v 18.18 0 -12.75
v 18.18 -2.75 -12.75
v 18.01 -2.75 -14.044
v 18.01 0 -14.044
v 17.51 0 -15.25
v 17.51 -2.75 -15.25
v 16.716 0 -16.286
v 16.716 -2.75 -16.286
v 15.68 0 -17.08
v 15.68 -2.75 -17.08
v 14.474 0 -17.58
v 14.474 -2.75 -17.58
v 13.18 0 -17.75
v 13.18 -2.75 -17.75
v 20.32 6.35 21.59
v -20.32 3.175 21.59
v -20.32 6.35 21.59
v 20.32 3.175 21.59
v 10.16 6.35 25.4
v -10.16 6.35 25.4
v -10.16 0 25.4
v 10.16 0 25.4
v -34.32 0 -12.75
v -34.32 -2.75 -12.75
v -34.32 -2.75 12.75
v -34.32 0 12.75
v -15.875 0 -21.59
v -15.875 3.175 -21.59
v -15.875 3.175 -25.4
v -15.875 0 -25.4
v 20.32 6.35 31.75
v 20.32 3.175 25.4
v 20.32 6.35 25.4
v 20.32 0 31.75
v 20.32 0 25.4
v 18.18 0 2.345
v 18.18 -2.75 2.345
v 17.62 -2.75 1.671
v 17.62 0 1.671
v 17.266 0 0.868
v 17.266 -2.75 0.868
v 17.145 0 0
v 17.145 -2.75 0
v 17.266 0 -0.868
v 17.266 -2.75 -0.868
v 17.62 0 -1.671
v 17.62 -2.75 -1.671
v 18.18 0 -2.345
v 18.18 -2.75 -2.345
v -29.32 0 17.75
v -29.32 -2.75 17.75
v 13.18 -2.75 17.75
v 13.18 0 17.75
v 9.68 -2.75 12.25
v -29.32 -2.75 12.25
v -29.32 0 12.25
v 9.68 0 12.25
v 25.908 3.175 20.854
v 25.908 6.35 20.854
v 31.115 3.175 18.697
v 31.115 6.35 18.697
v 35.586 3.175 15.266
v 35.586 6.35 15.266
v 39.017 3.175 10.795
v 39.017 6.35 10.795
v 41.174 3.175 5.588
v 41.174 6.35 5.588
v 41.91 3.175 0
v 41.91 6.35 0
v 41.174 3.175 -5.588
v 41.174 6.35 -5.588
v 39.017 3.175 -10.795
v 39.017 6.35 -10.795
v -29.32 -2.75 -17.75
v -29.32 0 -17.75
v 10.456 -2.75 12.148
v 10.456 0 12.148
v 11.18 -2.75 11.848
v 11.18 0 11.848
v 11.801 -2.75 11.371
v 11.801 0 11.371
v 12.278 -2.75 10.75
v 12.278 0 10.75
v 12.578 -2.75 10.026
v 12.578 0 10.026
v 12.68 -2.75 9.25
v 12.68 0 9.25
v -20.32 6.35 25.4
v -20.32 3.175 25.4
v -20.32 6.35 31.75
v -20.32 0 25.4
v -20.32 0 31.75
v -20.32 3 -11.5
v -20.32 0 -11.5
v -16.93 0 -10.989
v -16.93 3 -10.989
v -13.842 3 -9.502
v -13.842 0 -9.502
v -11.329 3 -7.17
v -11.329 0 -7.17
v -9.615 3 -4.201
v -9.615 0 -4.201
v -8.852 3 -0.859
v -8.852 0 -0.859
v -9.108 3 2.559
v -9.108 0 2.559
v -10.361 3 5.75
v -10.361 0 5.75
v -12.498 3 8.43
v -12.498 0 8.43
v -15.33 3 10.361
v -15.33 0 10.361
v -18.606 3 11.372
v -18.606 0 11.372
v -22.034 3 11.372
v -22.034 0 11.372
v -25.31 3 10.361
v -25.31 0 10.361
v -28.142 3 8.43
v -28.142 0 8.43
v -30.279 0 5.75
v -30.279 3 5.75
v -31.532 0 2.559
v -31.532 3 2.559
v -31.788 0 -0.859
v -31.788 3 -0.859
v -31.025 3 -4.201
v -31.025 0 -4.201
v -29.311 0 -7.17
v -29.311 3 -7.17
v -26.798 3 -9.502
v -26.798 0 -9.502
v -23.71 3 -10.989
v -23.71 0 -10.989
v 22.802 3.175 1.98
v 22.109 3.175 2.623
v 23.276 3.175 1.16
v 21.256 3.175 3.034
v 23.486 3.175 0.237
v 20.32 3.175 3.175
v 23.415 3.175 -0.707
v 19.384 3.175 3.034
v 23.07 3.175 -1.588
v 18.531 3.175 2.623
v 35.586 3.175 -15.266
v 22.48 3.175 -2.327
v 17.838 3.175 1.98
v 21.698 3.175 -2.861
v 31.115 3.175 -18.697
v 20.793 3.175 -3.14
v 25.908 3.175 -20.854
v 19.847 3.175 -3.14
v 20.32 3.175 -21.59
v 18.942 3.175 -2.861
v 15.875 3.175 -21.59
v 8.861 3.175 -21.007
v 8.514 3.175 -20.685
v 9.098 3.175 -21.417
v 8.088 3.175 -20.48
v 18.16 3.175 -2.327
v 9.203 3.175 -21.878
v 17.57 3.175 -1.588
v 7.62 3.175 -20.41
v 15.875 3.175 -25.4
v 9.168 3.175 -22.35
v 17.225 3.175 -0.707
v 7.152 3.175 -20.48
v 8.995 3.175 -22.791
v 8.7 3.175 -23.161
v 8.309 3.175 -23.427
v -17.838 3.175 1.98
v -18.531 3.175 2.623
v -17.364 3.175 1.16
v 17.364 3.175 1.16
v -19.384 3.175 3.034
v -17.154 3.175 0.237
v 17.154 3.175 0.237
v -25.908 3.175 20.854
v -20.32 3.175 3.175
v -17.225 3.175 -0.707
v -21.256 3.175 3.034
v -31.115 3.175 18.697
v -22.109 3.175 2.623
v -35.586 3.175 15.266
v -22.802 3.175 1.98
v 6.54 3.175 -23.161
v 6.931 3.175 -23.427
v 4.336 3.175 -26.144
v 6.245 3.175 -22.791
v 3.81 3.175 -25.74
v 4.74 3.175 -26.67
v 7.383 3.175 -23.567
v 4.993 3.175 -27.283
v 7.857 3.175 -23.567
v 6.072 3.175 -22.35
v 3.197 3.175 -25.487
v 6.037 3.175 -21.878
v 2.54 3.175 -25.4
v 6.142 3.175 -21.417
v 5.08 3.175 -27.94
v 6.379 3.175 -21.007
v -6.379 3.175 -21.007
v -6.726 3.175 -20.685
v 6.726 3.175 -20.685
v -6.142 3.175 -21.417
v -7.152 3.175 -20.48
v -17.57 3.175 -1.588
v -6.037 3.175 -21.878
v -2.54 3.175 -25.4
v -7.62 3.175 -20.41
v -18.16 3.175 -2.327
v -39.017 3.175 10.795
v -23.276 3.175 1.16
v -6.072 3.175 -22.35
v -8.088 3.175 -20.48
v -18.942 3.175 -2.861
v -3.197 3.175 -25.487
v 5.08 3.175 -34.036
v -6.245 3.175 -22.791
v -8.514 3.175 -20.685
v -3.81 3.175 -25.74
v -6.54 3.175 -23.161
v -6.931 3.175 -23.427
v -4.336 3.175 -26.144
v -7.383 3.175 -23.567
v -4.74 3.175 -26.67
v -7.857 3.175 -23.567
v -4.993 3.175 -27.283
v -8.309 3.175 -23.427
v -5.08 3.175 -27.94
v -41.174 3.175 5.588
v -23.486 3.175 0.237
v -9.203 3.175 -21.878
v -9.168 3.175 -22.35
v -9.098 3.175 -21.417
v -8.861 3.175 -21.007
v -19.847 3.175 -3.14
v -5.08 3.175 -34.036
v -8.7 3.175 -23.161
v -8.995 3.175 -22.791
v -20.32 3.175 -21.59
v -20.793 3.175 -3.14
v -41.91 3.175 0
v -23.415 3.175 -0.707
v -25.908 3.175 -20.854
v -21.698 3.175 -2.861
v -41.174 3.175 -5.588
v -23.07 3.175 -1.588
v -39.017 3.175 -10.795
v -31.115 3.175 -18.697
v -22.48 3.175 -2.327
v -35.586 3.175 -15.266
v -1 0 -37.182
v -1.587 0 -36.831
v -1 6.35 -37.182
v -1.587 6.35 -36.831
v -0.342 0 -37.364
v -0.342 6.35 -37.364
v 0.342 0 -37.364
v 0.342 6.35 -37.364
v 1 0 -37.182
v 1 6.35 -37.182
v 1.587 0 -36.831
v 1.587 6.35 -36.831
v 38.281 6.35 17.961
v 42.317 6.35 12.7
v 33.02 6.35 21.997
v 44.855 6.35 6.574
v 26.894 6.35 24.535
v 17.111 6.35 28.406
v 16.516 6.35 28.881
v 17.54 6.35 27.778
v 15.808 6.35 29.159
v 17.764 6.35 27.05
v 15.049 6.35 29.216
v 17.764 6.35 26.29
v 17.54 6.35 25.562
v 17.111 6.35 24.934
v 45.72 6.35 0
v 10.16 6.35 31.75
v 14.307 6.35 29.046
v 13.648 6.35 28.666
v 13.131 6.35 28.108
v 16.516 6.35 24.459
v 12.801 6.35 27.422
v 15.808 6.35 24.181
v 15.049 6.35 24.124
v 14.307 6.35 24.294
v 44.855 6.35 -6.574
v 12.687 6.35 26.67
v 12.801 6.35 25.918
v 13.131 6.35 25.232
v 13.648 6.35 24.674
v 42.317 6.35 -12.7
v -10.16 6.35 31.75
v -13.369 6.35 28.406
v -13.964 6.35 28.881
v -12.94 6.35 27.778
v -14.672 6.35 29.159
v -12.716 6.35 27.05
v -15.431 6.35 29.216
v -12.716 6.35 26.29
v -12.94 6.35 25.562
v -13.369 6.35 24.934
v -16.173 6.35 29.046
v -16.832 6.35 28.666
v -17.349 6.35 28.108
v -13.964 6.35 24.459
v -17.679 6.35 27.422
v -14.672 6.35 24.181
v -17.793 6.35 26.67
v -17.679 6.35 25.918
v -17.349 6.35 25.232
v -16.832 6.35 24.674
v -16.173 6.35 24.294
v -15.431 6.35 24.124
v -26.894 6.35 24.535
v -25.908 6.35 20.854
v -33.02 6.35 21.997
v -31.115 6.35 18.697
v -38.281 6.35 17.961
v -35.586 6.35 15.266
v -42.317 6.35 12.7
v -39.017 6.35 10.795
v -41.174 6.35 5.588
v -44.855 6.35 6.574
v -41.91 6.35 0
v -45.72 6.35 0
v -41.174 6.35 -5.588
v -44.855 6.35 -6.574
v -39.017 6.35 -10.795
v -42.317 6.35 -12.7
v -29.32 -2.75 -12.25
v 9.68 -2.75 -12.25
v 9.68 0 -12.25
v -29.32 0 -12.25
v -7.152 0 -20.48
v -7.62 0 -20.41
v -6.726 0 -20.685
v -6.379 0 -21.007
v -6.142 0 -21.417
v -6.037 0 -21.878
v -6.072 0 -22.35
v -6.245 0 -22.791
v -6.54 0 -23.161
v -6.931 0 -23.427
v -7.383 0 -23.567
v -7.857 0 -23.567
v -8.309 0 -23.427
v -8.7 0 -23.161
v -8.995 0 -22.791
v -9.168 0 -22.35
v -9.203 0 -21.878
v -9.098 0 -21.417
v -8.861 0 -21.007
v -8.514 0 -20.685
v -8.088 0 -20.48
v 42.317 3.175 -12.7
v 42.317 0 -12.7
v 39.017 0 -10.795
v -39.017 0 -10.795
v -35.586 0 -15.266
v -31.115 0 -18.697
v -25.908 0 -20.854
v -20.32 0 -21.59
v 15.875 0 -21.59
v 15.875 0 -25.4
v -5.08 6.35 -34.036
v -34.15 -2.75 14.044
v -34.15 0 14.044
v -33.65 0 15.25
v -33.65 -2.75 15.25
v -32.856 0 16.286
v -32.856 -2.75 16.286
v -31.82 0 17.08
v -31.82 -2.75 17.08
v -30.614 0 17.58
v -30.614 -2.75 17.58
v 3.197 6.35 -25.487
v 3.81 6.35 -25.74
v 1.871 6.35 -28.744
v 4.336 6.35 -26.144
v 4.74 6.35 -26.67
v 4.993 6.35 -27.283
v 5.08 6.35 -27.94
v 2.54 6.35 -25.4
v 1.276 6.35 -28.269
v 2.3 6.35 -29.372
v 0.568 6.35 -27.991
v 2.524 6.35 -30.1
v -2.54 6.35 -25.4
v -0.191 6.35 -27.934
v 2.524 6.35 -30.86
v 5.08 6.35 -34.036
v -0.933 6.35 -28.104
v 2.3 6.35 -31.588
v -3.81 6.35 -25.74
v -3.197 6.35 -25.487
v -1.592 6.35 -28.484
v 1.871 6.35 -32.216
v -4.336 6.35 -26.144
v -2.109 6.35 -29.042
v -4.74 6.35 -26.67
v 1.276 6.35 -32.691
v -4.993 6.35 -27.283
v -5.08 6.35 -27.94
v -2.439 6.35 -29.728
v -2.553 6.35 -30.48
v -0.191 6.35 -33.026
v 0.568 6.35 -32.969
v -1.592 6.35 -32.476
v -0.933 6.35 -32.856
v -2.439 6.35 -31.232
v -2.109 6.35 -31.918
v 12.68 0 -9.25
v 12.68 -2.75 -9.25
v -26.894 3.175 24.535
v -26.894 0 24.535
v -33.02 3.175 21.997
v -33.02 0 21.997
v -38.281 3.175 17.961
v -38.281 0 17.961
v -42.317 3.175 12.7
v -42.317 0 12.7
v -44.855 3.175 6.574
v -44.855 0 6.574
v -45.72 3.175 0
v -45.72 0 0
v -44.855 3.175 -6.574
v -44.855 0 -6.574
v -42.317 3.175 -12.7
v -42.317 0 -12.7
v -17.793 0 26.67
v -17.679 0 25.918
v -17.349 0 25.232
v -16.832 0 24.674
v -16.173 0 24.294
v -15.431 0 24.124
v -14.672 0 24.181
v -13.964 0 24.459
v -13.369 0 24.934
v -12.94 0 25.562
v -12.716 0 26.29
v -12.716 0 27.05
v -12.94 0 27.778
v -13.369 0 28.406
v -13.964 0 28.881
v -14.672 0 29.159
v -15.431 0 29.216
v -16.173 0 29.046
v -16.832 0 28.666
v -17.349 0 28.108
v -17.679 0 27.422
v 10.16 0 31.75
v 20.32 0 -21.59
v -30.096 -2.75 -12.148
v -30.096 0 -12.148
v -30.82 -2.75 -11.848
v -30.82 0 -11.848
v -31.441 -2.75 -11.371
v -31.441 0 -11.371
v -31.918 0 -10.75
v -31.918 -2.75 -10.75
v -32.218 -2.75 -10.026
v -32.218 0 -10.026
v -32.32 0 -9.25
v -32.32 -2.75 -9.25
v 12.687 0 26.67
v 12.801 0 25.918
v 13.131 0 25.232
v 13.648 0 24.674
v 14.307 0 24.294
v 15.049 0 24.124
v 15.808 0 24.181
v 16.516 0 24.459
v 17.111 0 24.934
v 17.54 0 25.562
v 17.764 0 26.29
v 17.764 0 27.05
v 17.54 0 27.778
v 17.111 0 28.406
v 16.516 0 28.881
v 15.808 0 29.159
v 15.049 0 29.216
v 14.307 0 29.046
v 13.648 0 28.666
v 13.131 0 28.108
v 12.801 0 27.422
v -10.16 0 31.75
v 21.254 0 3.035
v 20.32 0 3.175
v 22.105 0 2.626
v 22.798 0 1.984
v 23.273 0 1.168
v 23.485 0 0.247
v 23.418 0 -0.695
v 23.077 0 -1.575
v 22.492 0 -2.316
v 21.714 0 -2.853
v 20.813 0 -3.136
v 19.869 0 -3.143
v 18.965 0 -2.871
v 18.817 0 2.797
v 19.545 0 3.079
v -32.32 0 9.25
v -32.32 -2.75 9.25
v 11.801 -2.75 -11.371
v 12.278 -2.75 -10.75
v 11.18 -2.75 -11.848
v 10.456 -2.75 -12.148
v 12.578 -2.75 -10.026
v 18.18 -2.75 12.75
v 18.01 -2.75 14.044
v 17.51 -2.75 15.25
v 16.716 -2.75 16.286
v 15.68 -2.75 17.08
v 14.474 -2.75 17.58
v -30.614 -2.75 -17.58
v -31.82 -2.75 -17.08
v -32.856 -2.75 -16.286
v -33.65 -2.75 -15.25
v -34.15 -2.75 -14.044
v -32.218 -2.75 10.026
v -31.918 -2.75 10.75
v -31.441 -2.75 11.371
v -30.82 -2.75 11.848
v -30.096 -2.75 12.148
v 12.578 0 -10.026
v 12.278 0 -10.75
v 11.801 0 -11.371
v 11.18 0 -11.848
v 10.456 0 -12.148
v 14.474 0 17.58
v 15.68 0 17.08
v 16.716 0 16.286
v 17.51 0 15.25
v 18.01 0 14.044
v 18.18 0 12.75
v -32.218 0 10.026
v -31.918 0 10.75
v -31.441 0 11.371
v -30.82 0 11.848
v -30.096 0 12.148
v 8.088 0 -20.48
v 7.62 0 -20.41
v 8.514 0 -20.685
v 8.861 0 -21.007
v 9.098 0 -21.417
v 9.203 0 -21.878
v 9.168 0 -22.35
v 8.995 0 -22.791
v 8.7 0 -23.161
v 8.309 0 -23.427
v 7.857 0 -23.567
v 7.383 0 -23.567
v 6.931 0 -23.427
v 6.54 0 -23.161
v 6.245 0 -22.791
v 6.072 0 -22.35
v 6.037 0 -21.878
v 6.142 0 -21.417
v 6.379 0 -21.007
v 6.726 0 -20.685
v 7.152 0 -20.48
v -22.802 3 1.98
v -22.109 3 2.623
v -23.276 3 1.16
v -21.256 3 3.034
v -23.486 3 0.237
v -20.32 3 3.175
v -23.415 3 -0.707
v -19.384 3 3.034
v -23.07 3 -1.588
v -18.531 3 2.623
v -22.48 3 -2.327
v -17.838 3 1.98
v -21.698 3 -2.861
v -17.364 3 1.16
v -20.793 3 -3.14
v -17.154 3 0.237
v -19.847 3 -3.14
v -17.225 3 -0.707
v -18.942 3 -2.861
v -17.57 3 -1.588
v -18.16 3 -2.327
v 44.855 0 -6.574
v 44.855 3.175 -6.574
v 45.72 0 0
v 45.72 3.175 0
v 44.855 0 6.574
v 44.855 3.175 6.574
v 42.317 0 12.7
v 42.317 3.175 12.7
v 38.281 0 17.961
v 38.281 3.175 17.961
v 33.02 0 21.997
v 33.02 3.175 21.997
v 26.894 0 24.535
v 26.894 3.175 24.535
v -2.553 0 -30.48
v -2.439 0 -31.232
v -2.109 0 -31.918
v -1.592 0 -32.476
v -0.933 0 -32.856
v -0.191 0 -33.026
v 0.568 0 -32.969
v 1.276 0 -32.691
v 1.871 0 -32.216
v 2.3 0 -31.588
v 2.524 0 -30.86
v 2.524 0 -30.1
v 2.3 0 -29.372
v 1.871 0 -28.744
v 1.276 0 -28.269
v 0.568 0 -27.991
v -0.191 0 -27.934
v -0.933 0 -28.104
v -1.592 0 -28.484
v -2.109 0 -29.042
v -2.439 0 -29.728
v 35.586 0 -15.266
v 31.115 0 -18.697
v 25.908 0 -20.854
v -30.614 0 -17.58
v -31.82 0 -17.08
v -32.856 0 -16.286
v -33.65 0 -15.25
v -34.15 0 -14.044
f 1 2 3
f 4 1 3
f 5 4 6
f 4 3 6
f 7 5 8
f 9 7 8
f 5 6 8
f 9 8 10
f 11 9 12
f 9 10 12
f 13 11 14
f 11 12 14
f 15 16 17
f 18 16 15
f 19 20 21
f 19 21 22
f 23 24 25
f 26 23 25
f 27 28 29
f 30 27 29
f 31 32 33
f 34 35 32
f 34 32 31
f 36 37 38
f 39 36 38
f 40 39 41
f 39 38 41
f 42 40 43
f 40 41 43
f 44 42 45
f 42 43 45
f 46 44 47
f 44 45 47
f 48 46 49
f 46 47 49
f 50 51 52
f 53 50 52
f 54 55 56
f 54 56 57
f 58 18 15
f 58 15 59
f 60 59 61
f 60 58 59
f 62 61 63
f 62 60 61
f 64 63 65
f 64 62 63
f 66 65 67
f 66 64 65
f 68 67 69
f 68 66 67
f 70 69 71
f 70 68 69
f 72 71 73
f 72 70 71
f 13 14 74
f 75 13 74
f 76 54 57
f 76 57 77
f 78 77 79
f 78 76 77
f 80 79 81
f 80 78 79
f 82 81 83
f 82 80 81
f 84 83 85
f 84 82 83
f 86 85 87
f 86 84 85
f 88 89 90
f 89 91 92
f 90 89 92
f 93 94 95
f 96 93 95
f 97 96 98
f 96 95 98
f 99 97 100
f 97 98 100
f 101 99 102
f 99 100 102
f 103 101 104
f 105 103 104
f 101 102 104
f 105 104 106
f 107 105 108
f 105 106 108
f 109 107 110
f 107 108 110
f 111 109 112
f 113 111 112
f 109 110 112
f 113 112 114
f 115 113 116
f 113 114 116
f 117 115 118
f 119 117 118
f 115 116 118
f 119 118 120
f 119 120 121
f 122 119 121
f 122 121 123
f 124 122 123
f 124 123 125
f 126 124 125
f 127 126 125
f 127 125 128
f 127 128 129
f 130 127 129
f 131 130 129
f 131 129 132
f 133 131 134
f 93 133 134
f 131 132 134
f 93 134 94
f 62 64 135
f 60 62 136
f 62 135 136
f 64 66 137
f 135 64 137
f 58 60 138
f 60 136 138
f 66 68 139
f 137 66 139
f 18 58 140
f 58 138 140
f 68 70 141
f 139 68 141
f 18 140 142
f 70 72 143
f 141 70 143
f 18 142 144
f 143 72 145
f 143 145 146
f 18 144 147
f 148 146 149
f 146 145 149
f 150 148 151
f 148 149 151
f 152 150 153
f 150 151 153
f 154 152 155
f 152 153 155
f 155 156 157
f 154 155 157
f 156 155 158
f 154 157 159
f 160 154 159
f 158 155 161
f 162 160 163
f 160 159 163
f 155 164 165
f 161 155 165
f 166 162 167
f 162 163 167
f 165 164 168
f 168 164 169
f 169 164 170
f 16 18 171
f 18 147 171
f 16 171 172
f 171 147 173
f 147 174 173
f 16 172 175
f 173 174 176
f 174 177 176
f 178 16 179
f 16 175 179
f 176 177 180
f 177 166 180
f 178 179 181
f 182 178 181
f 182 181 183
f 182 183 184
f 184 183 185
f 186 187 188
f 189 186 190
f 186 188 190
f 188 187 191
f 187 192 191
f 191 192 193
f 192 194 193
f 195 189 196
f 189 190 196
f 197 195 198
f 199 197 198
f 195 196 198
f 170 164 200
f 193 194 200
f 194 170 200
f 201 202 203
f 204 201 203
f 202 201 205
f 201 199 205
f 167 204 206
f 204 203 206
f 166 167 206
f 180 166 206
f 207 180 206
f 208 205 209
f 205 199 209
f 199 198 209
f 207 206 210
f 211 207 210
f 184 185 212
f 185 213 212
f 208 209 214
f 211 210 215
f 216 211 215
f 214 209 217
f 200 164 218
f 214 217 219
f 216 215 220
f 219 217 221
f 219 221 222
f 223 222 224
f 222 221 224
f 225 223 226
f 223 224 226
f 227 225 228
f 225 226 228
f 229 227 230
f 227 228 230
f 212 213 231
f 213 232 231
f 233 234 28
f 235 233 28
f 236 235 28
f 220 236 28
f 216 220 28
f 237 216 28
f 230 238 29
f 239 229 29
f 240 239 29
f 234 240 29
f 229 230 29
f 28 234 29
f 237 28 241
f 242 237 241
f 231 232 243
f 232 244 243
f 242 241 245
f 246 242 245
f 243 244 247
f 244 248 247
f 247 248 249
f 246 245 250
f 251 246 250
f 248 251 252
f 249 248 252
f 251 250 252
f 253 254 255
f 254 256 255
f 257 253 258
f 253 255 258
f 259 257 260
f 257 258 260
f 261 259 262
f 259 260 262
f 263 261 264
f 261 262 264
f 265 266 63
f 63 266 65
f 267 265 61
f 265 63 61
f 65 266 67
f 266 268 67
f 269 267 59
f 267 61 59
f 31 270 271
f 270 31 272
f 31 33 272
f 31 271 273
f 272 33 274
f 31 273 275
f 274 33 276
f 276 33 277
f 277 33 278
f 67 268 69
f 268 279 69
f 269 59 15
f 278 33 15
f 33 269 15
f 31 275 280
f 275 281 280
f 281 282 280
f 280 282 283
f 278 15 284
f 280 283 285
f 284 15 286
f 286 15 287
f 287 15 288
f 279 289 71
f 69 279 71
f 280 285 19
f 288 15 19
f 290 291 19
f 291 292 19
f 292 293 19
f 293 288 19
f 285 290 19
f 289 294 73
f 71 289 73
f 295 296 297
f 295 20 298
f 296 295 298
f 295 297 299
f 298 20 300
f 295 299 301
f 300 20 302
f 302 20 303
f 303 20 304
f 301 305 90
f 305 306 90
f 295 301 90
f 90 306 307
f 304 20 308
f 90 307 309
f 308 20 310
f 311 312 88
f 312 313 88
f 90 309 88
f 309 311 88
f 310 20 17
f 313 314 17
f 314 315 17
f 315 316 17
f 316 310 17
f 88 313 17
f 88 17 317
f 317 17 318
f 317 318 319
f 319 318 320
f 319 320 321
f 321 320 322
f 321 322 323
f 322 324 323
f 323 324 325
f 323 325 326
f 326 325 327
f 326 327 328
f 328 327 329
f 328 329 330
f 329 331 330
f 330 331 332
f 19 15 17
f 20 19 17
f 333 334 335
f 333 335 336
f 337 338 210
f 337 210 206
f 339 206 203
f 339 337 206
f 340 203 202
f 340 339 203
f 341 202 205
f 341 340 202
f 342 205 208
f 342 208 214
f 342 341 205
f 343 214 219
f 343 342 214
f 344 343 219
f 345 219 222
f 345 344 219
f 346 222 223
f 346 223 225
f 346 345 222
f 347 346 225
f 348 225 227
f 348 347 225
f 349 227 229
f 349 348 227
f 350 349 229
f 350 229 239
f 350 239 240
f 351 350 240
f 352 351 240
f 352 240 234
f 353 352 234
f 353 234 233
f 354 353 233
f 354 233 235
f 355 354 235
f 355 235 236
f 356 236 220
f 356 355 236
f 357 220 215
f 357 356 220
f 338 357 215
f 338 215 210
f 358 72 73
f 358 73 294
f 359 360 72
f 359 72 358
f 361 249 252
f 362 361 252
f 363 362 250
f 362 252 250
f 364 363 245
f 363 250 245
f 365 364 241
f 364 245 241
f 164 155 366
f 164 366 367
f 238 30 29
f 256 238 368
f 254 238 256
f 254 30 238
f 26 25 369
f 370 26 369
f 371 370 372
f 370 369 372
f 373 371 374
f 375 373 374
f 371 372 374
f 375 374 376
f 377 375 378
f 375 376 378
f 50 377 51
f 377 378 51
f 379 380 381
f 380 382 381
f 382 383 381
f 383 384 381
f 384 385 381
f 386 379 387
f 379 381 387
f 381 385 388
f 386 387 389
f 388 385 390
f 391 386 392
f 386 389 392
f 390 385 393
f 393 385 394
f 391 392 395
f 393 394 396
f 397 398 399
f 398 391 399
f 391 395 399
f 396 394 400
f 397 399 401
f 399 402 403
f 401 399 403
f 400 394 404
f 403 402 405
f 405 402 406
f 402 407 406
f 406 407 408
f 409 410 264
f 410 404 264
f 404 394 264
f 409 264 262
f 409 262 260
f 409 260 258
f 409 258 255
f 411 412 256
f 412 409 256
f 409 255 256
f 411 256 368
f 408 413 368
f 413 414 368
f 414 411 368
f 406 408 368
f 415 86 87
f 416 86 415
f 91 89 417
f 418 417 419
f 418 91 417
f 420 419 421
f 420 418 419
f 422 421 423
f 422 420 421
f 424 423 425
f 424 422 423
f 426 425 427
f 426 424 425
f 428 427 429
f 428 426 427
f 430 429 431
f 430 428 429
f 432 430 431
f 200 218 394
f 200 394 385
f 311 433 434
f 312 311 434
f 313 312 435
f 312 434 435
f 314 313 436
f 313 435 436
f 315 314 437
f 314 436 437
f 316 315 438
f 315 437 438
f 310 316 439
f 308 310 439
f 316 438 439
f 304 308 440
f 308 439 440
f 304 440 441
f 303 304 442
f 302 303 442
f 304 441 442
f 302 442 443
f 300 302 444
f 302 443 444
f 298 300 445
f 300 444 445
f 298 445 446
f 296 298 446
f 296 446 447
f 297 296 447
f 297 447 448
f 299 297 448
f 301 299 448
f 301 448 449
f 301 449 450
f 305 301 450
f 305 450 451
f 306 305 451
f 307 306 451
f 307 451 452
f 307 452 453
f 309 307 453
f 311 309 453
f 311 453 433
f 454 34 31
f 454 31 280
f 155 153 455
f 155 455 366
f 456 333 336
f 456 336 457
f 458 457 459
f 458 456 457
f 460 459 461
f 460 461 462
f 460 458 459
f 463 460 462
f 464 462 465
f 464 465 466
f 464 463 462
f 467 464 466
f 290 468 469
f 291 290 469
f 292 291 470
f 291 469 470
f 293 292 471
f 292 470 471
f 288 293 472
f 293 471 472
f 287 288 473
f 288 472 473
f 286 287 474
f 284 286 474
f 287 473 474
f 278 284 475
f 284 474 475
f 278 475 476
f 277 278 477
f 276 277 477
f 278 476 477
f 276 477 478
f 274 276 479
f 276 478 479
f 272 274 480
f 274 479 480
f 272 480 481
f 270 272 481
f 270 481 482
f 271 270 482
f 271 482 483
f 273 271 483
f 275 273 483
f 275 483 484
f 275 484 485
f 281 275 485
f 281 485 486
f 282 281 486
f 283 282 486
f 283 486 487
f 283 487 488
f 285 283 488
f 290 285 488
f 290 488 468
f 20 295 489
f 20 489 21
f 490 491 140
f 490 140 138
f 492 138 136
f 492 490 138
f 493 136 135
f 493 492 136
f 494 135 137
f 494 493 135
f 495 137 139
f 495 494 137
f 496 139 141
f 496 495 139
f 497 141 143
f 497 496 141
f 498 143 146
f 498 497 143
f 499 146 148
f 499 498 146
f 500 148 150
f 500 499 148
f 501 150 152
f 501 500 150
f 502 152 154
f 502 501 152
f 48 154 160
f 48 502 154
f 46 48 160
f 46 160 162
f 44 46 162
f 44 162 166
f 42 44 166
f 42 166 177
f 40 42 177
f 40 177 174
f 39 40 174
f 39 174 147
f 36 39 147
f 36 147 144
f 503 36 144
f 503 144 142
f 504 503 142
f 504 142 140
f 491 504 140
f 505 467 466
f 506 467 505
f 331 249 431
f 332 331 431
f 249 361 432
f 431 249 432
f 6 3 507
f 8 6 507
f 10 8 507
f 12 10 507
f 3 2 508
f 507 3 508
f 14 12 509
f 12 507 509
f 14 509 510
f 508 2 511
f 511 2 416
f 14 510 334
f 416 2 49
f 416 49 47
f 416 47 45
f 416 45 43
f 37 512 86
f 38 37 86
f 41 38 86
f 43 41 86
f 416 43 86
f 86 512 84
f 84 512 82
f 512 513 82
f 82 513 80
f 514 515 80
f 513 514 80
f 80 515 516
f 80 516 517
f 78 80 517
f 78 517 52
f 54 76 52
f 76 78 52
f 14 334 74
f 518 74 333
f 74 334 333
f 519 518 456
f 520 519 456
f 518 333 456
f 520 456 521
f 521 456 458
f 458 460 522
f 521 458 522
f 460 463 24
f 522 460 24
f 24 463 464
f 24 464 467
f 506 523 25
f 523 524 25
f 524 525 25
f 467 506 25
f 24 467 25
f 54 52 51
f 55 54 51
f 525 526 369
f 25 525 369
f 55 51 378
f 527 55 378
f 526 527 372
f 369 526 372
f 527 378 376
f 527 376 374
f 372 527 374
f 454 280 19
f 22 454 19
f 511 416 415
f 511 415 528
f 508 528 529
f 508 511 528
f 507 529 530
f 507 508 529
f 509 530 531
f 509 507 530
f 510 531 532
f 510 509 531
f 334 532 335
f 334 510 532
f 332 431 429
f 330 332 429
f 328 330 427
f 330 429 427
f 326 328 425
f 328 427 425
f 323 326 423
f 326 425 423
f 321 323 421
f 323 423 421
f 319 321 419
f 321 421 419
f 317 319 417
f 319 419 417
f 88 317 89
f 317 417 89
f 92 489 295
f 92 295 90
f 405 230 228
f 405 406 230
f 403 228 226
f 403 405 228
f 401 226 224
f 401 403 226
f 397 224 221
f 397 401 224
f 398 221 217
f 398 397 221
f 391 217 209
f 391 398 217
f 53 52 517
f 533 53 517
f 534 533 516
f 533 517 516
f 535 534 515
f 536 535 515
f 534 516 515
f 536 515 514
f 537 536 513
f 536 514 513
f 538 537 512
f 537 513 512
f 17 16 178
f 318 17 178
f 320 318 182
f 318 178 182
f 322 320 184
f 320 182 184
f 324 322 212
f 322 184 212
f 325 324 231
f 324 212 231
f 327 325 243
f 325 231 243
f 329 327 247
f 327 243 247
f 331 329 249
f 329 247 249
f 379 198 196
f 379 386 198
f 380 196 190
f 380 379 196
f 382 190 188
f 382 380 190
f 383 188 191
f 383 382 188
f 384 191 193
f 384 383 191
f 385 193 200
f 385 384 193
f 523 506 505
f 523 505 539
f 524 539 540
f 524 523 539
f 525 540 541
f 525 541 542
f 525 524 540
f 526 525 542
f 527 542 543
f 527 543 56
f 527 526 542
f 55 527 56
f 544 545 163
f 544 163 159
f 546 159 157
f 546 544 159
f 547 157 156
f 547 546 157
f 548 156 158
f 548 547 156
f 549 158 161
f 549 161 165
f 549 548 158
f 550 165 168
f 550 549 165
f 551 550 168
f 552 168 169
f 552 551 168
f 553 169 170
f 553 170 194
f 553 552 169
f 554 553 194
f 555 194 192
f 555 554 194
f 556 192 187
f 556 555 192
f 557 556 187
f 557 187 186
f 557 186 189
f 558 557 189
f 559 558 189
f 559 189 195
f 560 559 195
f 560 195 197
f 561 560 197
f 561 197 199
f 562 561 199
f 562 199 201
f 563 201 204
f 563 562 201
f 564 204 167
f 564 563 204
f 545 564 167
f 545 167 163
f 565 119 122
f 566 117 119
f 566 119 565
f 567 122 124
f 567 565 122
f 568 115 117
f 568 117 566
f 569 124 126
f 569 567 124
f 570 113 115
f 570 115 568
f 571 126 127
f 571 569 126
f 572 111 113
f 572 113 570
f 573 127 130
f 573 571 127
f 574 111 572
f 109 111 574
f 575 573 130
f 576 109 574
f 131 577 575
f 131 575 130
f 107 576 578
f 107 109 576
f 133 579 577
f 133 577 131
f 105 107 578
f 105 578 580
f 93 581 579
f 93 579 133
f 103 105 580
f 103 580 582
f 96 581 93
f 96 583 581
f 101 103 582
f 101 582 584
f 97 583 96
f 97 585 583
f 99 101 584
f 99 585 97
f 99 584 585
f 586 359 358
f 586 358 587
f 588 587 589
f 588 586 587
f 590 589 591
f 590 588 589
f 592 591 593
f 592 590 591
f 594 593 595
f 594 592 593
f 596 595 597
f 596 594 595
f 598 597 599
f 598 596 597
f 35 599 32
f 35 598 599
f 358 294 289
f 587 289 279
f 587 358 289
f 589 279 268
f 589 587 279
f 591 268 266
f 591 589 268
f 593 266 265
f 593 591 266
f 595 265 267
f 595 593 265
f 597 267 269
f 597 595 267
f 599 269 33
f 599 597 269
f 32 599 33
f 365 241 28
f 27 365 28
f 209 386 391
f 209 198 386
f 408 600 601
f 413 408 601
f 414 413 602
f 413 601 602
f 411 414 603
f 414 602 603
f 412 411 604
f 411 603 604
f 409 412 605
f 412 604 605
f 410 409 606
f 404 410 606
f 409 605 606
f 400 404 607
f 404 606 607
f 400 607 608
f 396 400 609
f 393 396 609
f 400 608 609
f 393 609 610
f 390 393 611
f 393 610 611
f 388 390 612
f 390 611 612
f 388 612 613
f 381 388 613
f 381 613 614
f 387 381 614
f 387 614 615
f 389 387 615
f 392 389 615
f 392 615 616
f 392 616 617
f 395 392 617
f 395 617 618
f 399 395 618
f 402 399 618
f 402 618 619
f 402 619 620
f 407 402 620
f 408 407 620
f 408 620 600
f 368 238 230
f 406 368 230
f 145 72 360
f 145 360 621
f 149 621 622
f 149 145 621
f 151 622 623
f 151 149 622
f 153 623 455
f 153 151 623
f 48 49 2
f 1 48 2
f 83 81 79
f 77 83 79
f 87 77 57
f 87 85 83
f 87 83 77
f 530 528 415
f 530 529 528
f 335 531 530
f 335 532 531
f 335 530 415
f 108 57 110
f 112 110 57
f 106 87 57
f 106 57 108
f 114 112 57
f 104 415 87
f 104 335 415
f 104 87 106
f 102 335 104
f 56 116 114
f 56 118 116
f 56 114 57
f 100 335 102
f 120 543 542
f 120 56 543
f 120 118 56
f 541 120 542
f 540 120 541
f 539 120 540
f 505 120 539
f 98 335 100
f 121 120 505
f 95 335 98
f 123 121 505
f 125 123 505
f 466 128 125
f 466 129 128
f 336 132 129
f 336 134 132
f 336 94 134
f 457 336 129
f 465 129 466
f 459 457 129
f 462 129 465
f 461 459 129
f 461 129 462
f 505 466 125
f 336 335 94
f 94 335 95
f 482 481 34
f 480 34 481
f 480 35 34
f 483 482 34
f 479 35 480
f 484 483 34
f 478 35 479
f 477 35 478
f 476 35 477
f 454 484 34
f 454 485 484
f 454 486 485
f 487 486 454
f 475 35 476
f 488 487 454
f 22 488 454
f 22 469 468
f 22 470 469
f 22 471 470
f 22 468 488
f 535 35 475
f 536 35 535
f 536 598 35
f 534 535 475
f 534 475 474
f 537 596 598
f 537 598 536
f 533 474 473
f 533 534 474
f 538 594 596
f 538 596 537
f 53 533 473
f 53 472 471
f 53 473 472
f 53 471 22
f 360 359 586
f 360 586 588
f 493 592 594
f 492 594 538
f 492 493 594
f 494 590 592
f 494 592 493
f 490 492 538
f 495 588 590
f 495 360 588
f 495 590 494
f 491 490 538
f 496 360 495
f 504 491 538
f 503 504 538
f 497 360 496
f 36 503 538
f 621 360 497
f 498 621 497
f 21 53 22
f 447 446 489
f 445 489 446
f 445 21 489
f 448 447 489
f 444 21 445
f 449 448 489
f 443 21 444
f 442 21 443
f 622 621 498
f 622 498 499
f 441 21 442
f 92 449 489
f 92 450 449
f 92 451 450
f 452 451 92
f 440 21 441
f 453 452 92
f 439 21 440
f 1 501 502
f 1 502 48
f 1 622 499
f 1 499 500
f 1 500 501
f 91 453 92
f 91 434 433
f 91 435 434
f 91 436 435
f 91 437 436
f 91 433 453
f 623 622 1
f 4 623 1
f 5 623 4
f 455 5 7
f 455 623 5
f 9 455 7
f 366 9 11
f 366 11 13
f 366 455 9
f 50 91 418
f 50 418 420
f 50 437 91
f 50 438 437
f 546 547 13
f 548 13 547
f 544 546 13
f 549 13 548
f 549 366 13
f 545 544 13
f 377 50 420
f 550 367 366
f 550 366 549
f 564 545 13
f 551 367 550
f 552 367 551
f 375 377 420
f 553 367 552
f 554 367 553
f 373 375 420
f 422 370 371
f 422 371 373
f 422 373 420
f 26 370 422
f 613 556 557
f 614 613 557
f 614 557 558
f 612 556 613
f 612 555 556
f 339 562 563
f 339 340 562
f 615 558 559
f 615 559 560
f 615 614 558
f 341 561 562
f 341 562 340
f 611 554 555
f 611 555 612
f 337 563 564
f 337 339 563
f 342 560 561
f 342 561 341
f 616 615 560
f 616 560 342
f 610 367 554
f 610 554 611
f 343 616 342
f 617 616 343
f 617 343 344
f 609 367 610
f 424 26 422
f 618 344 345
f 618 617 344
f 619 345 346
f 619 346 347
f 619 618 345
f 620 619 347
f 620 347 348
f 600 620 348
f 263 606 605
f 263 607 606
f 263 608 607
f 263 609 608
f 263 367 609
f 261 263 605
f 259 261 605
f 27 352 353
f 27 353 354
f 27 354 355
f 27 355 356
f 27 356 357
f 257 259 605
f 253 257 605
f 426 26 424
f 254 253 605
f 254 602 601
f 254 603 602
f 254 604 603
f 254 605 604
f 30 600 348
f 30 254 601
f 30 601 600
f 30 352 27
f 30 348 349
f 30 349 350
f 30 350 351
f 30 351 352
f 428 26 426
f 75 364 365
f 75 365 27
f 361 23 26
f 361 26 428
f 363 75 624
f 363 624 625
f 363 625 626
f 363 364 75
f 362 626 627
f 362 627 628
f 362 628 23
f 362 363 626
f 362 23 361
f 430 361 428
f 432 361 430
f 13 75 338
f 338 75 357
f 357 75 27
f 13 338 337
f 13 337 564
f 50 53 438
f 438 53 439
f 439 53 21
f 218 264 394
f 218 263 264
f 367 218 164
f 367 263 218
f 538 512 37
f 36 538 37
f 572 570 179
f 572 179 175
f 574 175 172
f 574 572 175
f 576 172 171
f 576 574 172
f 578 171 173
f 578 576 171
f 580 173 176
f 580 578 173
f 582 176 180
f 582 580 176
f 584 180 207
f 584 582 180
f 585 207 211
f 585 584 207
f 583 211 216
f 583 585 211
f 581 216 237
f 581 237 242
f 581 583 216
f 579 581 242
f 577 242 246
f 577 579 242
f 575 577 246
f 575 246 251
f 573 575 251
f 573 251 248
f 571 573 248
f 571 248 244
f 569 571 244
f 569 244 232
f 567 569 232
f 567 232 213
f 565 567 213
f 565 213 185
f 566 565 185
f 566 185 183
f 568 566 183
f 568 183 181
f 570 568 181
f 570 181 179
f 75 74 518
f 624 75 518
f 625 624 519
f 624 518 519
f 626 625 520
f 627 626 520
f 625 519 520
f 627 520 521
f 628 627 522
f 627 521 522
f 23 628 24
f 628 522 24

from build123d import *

# Parameters (mm, degrees)
SKETCH1_R                    = 3.175
SKETCH1_R_2                  = 1.5875
BOSS_EXTRUDE1_DEPTH          = 3.175
CUT_EXTRUDE1_REACH           = 61.599
BOSS_EXTRUDE2_DEPTH          = 3.175
TAP_DRILL_FOR_10_HELICOIL2_D = 5.1054
FILLET1_R                    = 2.54
CUT_EXTRUDE2_REACH           = 61.146
SKETCH20_W                   = 20.32
SKETCH20_H                   = 6.35
SKETCH22_R                   = 11.5
CUT_EXTRUDE3_DEPTH           = 3
BOSS_EXTRUDE4_START          = 2.75
BOSS_EXTRUDE4_DEPTH          = 2.75


with BuildPart() as part:
    # Sketch1 → Boss-Extrude1 (new body)
    with BuildSketch(Plane(origin=(0, 0, 0), x_dir=(1, 0, 0), z_dir=(0, 1, 0))):
        with BuildLine():
            Line((-20.32, 25.4), (-15.875, 25.4))
            Line((-15.875, 25.4), (0, 38.1))
            Line((0, 38.1), (15.875, 25.4))
            Line((15.875, 25.4), (20.32, 25.4))
            ThreePointArc((20.32, 25.4), (45.72, 0), (20.32, -25.4))
            Line((20.32, -25.4), (20.32, -31.75))
            Line((20.32, -31.75), (-20.32, -31.75))
            Line((-20.32, -31.75), (-20.32, -25.4))
            ThreePointArc((-20.32, -25.4), (-45.72, 0), (-20.32, 25.4))
        make_face()
        with Locations(Location((20.32, 0, 0), (0, 0, 270))):
            Circle(SKETCH1_R, mode=Mode.SUBTRACT)
        with Locations(Location((7.62, 21.997045256, 0), (0, 0, 270))):
            Circle(SKETCH1_R_2, mode=Mode.SUBTRACT)
        with Locations(Location((-20.32, 0, 0), (0, 0, 270))):
            Circle(SKETCH1_R, mode=Mode.SUBTRACT)
        with Locations(Location((-7.62, 21.997045256, 0), (0, 0, 270))):
            Circle(SKETCH1_R_2, mode=Mode.SUBTRACT)
    extrude(amount=BOSS_EXTRUDE1_DEPTH)

    # Sketch7 → Cut-Extrude1 (cut, up to next)
    with BuildSketch(Plane(origin=(0, 3.175, 0), x_dir=(1, 0, 0), z_dir=(0, 1, 0)), mode=Mode.PRIVATE) as cut_extrude1_sk1:
        with BuildLine():
            Line((-42.317045256, 12.7), (-39.017488468, 10.795))
            ThreePointArc((-39.017488468, 10.795), (-31.115, 18.697488468), (-20.32, 21.59))
            Line((-20.32, 21.59), (-15.875, 21.59))
            Line((-15.875, 21.59), (-15.875, 25.008038208))
            ThreePointArc((-15.875, 25.008038208), (-18.088875897, 25.301819801), (-20.32, 25.4))
            ThreePointArc((-20.32, 25.4), (-33.02, 21.997045256), (-42.317045256, 12.7))
        make_face()
    cut_extrude1_tool1 = extrude(cut_extrude1_sk1.sketch, amount=-CUT_EXTRUDE1_REACH, mode=Mode.PRIVATE) & part.part
    # Sketch7 → Cut-Extrude1 (cut, up to next)
    with BuildSketch(Plane(origin=(0, 3.175, 0), x_dir=(1, 0, 0), z_dir=(0, 1, 0)), mode=Mode.PRIVATE) as cut_extrude1_sk2:
        with BuildLine():
            Line((-15.875, 25.4), (-20.32, 25.4))
            ThreePointArc((-20.32, 25.4), (-18.088875897, 25.301819801), (-15.875, 25.008038208))
            Line((-15.875, 25.008038208), (-15.875, 25.4))
        make_face()
    cut_extrude1_tool2 = extrude(cut_extrude1_sk2.sketch, amount=-CUT_EXTRUDE1_REACH, mode=Mode.PRIVATE) & part.part
    cut_extrude1_1 = cut_extrude1_tool1.solids().sort_by_distance((-29.568041, 3.175, -20.060943))[0]
    add(cut_extrude1_1, mode=Mode.SUBTRACT)
    cut_extrude1_2 = cut_extrude1_tool2.solids().sort_by_distance((-16.984528, 3.175, -25.282569))[0]
    add(cut_extrude1_2, mode=Mode.SUBTRACT)
    cut_extrude1 = cut_extrude1_1 + cut_extrude1_2  # Cut-Extrude1 as one shape, for the pattern or mirror that repeats it

    # Sketch9 → Boss-Extrude2 (add)
    with BuildSketch(Plane(origin=(0, 3.175, 0), x_dir=(1, 0, 0), z_dir=(0, 1, 0))):
        with BuildLine():
            ThreePointArc((-20.32, -21.59), (-39.017488468, -10.795), (-39.017488468, 10.795))
            Line((-39.017488468, 10.795), (-42.317045256, 12.7))
            ThreePointArc((-42.317045256, 12.7), (-42.317045256, -12.7), (-20.32, -25.4))
            Line((-20.32, -25.4), (-20.32, -31.75))
            Line((-20.32, -31.75), (-10.16, -31.75))
            Line((-10.16, -31.75), (-10.16, -25.4))
            Line((-10.16, -25.4), (0, -25.4))
            Line((0, -25.4), (0, -21.59))
            Line((0, -21.59), (-20.32, -21.59))
        make_face()
        Polygon((0, 25.4), (0, 38.1), (-5.08, 34.036), (-5.08, 25.4), align=None)
    boss_extrude2 = extrude(amount=BOSS_EXTRUDE2_DEPTH)

    # Mirror1: Cut-Extrude1, Boss-Extrude2 across plane
    add(cut_extrude1.mirror(Plane(origin=(0, 0, 0), x_dir=(0, 0, 1), z_dir=(1, 0, 0))), mode=Mode.SUBTRACT)
    add(boss_extrude2.mirror(Plane(origin=(0, 0, 0), x_dir=(0, 0, 1), z_dir=(1, 0, 0))))

    # Tap Drill for #10 Helicoil2 (through all)
    with Locations(Plane(origin=(0, 6.35, 0), x_dir=(1, 0, 0), z_dir=(0, 1, 0))):
        with Locations((-15.24, -26.67), (15.24, -26.67), (0, 30.48)):
            Hole(TAP_DRILL_FOR_10_HELICOIL2_D / 2)

    # Fillet1
    fillet1_edges = [part.edges().sort_by_distance(p)[0] for p in [
        (5.08, 4.7625, -25.4),
        (0, 3.175, -38.1),
        (-5.08, 4.7625, -25.4),
    ]]
    fillet(fillet1_edges, radius=FILLET1_R)

    # Sketch20 → Cut-Extrude2 (cut, up to next)
    with BuildSketch(Plane(origin=(0, 3.175, 0), x_dir=(1, 0, 0), z_dir=(0, 1, 0)), mode=Mode.PRIVATE) as cut_extrude2_sk1:
        with Locations((0, -28.575)):
            Rectangle(SKETCH20_W, SKETCH20_H)
    cut_extrude2_tool1 = extrude(cut_extrude2_sk1.sketch, amount=-CUT_EXTRUDE2_REACH, mode=Mode.PRIVATE) & part.part
    add(cut_extrude2_tool1.solids().sort_by_distance((0, 3.175, 28.575))[0], mode=Mode.SUBTRACT)

    # Sketch22 → Cut-Extrude3 (cut)
    with BuildSketch(Plane.XZ):
        with Locations(Location((-20.32, 0, 0), (0, 0, 270))):
            Circle(SKETCH22_R)
    extrude(amount=-CUT_EXTRUDE3_DEPTH, mode=Mode.SUBTRACT)

    # Sketch23 → Boss-Extrude4 (add)
    with BuildSketch(Plane.XZ.offset(BOSS_EXTRUDE4_START)):
        with BuildLine():
            Line((18.18, -2.3454264), (18.18, -12.75))
            ThreePointArc((18.18, -12.75), (16.715533906, -16.285533906), (13.18, -17.75))
            Line((13.18, -17.75), (-29.32, -17.75))
            ThreePointArc((-29.32, -17.75), (-32.855533906, -16.285533906), (-34.32, -12.75))
            Line((-34.32, -12.75), (-34.32, 12.75))
            ThreePointArc((-34.32, 12.75), (-32.855533906, 16.285533906), (-29.32, 17.75))
            Line((-29.32, 17.75), (13.18, 17.75))
            ThreePointArc((13.18, 17.75), (16.715533906, 16.285533906), (18.18, 12.75))
            Line((18.18, 12.75), (18.18, 2.3454264))
            ThreePointArc((18.18, 2.3454264), (17.145, 0), (18.18, -2.3454264))
        make_face()
        with BuildLine():
            Line((-29.32, 12.25), (9.68, 12.25))
            ThreePointArc((9.68, 12.25), (11.801320344, 11.371320344), (12.68, 9.25))
            Line((12.68, 9.25), (12.68, -9.25))
            ThreePointArc((12.68, -9.25), (11.801320344, -11.371320344), (9.68, -12.25))
            Line((9.68, -12.25), (-29.32, -12.25))
            ThreePointArc((-29.32, -12.25), (-31.441320344, -11.371320344), (-32.32, -9.25))
            Line((-32.32, -9.25), (-32.32, 9.25))
            ThreePointArc((-32.32, 9.25), (-31.441320344, 11.371320344), (-29.32, 12.25))
        make_face(mode=Mode.SUBTRACT)
    extrude(amount=-BOSS_EXTRUDE4_DEPTH)


solid = part.part
